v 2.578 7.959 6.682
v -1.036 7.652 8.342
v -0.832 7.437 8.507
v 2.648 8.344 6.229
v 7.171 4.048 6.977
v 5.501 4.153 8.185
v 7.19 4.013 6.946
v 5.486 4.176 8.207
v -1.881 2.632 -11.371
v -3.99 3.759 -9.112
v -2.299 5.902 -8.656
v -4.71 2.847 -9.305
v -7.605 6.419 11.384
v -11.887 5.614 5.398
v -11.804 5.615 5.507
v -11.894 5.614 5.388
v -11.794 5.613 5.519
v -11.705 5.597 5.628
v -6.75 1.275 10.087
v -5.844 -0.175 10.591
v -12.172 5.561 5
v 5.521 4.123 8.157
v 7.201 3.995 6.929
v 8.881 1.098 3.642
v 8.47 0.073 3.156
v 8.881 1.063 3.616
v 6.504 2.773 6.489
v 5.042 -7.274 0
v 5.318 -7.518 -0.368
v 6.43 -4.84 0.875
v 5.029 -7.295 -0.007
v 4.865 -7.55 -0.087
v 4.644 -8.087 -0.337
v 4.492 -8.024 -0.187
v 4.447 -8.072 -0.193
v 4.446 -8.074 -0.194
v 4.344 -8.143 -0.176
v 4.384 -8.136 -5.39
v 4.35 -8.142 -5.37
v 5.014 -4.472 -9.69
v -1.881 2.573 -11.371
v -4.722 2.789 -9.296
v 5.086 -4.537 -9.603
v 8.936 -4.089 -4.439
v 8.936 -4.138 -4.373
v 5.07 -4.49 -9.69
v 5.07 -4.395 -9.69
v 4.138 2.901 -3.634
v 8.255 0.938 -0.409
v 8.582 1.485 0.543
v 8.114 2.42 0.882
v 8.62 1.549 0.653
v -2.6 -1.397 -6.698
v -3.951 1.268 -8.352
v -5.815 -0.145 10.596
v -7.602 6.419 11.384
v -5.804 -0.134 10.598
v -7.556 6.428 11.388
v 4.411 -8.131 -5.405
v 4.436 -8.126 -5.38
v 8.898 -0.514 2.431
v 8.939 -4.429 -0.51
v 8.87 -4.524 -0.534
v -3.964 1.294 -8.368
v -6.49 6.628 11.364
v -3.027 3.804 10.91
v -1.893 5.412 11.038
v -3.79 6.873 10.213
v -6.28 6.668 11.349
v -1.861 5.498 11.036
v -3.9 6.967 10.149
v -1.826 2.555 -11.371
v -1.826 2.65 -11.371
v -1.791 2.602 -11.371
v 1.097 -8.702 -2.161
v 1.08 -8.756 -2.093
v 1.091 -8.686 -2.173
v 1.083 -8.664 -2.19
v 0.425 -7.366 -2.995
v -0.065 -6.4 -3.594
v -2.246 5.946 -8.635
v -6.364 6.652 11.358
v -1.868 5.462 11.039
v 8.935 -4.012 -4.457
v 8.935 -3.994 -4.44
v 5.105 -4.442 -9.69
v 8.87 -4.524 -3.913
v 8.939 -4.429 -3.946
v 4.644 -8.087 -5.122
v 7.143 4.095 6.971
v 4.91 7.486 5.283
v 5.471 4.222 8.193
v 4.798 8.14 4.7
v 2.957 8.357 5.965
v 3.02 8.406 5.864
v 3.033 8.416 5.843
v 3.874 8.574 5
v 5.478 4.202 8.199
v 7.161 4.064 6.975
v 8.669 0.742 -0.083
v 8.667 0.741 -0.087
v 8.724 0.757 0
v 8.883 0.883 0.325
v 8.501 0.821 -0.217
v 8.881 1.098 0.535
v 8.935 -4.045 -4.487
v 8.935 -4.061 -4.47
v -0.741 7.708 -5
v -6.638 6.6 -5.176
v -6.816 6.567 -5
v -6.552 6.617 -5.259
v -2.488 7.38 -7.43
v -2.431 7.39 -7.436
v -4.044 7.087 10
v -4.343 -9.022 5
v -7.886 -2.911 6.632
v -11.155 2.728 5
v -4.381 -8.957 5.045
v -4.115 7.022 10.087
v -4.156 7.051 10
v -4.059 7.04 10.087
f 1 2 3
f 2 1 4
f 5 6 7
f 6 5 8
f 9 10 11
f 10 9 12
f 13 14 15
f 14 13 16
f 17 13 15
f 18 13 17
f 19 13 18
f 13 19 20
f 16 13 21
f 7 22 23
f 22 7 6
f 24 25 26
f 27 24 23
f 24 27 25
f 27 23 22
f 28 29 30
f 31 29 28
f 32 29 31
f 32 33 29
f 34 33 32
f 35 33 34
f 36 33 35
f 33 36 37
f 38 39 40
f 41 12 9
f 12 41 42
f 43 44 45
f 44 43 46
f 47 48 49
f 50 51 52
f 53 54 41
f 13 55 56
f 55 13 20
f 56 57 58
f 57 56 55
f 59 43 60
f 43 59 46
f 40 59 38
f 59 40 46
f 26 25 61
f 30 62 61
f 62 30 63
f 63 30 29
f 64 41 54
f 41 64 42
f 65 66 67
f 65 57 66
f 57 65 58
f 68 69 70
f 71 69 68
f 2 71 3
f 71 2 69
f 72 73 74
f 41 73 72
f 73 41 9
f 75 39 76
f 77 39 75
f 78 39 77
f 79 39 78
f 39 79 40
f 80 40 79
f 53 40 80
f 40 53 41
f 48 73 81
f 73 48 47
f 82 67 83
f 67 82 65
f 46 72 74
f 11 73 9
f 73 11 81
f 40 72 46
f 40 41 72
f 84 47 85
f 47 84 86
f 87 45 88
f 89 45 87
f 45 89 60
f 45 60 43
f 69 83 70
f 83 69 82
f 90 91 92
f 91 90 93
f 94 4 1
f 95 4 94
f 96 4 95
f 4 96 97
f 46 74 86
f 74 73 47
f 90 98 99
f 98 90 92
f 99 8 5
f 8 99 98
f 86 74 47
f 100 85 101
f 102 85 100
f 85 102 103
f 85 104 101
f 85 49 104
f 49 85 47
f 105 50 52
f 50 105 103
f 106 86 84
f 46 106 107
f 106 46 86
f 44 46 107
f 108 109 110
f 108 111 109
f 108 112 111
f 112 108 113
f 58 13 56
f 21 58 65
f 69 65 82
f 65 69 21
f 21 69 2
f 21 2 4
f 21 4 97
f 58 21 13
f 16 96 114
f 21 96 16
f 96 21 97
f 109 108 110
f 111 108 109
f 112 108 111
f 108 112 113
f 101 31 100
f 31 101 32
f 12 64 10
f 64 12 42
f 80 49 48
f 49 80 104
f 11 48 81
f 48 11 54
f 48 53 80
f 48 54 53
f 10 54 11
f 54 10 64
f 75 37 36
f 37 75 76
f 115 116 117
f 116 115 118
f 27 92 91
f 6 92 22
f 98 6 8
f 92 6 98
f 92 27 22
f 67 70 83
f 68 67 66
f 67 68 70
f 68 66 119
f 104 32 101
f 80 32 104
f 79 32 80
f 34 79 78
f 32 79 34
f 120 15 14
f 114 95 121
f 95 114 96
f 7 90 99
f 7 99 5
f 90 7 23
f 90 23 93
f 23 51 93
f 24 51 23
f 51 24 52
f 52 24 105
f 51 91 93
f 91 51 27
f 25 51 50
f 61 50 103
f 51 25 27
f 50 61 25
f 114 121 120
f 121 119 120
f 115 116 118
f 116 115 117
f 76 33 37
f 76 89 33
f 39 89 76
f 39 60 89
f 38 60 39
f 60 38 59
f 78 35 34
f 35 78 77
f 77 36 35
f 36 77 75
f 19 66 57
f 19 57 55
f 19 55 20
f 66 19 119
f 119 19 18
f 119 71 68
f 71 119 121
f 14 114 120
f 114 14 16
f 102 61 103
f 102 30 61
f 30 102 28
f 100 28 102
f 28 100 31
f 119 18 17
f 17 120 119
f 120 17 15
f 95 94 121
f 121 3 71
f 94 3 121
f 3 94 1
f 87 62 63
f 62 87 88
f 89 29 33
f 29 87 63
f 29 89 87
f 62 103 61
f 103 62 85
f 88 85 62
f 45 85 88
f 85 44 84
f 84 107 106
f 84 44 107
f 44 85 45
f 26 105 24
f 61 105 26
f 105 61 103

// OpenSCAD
// Auto-generated OpenSCAD file

    inner_points = 10*[[-0.4074818991364223, 0.6992365292821007, 1.0000000000000828], [-0.3898663328584005, -0.9589823018207535, -0.5000000000001132], [0.44367143495763933, 0.8590426676513406, 0.5000000000000088], [-0.8242507830446055, -0.20977595545377065, -0.9999999999999784], [-0.8242507830443877, -0.20977595545400485, 1.0000000000000218], [-0.38986633285829164, -0.9589823018208707, 0.4999999999998866], [0.44367143495753053, 0.8590426676514578, -0.4999999999999911], [-0.4074818991366401, 0.6992365292823348, -0.9999999999999172], [-1.2586352332305926, 0.5394303909129777, 0.5000000000001568], [0.46128700123576977, -0.7991761634516306, -1.8726686867864828e-13], [0.8780558851437354, 0.10983632128447508, -1.2620460232426467e-13], [-1.2586352332307016, 0.539430390913095, -0.49999999999984335], [0.44954329038379176, 0.3063030572835663, 1.3333333333332769], [0.032774406475826245, -0.6027094274525393, 1.3333333333332158], [0.883927740569888, -0.44290328908329923, 0.8333333333331419]];

    outer_points = 10*[[-0.2818912922299794, 1.0259982195154702, -0.49281330432121767], [-0.4169920179568701, -1.0259982195154702, 0.38528601131022405], [0.30986993589944156, 1.0873280397967147, 0.31096359384582334], [0.3890133742874079, -1.0873280397967147, -0.20343630083482972], [-0.990100816973316, 0.3215561330780754, -0.5397240271737466], [-1.1065491135872318, -0.3215561330780754, 0.21714214814076563], [0.9994270315298034, 0.38288595335931963, 0.4791074570152818], [1.0972228990307444, -0.38288595335931963, -0.1565255779823009], [-0.18409542472903828, 0.2602263127968311, -1.1284463393188005], [-0.5147878854578112, -0.2602263127968311, 1.0209190463078066], [0.1934216392855257, 0.4442157736405639, 1.0678297691603356], [0.5054616709013238, -0.4442157736405639, -0.9603024761493418], [-0.654573100183338, 1.342585342036261, 0.3794715481636927], [-1.3627826249266748, 0.6381432555988661, 0.33256082531116393], [-0.7710213967972539, 0.6994730758801104, 1.1363377234782046]];

    // Convex hull for inner set (I)
    module inner_hull() {
        hull() {
            for (p = inner_points) {
                translate(p) sphere(r=0.1);
            }
        }
    }

    // Convex hull for outer set (O) minus inner hull (O \ I)
    module outer_minus_inner() {
        difference() {
            hull() {
                for (p = outer_points) {
                    translate(p) sphere(r=0.1);
                }
            }
            inner_hull(); // Subtract inner hull
        }
    }

    // Convex hull for outer set (O) minus all translated inner hulls
    module outer_minus_AllTranslationInner() {
        difference() {
            hull() {
                for (p = outer_points) {
                    translate(p) sphere(r=0.1);
                }
            }
            hull() {
                translate([0,0,50]) inner_hull();
                translate([0,0,-50]) inner_hull();
            }; // Subtract translated inner hulls
        }
    }

    // Difference between outer_minus_inner and outer_minus_AllTranslationInner
    module outer_minus_inner_diff() {
        difference() {
            // Outer minus inner
            difference() {
                hull() {
                    for (p = outer_points) {
                        translate(p) sphere(r=0.1);
                    }
                }
                inner_hull();
            }

            // Subtract Outer minus AllTranslationInner
            difference() {
                hull() {
                    for (p = outer_points) {
                        translate(p) sphere(r=0.1);
                    }
                }
                hull() {
                    translate([0,0,50]) inner_hull();
                    translate([0,0,-50]) inner_hull();
                };
            }
        }
    }

    // Rendering all with colors applied
    color([1, 1, 0, 1]) outer_minus_inner_diff(); // Opaque yellow
    
